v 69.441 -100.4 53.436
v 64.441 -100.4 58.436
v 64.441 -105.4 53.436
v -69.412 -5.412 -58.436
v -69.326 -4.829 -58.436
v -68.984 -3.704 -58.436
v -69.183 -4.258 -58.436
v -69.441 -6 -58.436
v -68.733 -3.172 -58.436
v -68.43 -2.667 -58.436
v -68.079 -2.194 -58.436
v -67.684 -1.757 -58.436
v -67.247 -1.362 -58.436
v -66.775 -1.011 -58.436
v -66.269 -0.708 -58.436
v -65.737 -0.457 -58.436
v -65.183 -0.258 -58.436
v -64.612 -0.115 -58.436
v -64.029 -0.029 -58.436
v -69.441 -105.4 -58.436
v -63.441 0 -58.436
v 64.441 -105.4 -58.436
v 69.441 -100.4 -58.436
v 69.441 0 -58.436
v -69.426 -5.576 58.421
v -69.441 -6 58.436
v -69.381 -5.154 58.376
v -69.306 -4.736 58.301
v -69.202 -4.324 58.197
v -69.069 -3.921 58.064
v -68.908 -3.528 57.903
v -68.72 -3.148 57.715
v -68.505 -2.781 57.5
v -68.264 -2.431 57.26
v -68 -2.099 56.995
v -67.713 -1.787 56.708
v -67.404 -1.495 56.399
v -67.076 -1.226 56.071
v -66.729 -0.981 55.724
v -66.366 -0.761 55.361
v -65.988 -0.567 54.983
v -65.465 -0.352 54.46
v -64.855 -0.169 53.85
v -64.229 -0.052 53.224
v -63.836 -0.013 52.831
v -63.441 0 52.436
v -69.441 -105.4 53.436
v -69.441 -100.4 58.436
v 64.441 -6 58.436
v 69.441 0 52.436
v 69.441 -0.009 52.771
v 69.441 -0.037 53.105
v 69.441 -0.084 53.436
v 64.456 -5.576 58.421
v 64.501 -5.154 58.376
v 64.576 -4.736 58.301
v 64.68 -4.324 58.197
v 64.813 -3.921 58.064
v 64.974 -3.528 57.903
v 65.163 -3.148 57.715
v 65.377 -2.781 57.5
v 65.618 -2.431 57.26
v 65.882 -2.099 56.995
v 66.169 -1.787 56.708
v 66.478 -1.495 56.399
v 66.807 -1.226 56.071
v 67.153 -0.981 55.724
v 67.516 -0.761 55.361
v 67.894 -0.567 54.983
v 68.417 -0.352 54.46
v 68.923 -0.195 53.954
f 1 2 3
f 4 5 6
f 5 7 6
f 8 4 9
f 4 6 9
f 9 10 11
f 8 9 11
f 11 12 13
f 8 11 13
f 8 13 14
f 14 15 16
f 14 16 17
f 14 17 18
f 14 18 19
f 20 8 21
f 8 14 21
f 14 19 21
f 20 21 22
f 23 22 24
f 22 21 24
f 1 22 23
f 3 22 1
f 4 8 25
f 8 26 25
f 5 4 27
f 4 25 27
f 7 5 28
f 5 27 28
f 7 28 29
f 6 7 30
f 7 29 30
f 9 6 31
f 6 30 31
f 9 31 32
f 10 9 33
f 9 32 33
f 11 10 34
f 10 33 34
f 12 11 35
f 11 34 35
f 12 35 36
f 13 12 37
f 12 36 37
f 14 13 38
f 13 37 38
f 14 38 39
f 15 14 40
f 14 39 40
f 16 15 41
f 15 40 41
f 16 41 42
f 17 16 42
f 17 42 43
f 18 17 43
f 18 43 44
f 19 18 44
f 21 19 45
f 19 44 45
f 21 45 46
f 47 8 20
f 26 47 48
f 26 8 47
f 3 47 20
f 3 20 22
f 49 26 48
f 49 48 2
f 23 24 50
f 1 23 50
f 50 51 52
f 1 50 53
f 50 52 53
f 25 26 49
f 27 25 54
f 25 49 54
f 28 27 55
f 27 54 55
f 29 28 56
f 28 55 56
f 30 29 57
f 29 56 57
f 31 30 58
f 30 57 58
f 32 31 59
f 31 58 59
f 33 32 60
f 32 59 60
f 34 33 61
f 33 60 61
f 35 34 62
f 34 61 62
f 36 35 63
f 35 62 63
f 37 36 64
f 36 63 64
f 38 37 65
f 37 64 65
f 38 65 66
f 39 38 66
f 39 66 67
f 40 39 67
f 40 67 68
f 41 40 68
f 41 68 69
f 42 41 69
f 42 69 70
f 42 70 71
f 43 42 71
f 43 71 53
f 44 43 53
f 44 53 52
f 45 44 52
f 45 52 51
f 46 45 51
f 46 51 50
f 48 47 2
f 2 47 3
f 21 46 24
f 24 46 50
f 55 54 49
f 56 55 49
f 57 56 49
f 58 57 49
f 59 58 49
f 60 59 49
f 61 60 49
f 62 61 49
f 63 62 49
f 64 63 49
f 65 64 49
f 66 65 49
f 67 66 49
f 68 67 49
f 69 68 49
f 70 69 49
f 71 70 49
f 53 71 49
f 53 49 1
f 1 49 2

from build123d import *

# Parameters (mm, degrees)
F0_W     = 138.88222
F0_H     = 116.872258
F1_DEPTH = 105.4
F2_SIZE  = 5
F3_R     = 6


with BuildPart() as f1:
    # F0 (on Front) → F1 (new body)
    with BuildSketch(Plane.XZ):
        Rectangle(F0_W, F0_H)
    extrude(amount=F1_DEPTH)

    # F2
    f2_edges = [f1.edges().sort_by_distance(p)[0] for p in [
        (69.44111, -52.7, 58.436129),
        (0, -105.4, 58.436129),
        (69.44111, -105.4, 0),
    ]]
    chamfer(f2_edges, length=F2_SIZE)

    # F3
    f3_edges = [f1.edges().sort_by_distance(p)[0] for p in [
        (-69.44111, 0, 0),
        (-2.5, 0, 58.436129),
    ]]
    fillet(f3_edges, radius=F3_R)


solid = f1.part
